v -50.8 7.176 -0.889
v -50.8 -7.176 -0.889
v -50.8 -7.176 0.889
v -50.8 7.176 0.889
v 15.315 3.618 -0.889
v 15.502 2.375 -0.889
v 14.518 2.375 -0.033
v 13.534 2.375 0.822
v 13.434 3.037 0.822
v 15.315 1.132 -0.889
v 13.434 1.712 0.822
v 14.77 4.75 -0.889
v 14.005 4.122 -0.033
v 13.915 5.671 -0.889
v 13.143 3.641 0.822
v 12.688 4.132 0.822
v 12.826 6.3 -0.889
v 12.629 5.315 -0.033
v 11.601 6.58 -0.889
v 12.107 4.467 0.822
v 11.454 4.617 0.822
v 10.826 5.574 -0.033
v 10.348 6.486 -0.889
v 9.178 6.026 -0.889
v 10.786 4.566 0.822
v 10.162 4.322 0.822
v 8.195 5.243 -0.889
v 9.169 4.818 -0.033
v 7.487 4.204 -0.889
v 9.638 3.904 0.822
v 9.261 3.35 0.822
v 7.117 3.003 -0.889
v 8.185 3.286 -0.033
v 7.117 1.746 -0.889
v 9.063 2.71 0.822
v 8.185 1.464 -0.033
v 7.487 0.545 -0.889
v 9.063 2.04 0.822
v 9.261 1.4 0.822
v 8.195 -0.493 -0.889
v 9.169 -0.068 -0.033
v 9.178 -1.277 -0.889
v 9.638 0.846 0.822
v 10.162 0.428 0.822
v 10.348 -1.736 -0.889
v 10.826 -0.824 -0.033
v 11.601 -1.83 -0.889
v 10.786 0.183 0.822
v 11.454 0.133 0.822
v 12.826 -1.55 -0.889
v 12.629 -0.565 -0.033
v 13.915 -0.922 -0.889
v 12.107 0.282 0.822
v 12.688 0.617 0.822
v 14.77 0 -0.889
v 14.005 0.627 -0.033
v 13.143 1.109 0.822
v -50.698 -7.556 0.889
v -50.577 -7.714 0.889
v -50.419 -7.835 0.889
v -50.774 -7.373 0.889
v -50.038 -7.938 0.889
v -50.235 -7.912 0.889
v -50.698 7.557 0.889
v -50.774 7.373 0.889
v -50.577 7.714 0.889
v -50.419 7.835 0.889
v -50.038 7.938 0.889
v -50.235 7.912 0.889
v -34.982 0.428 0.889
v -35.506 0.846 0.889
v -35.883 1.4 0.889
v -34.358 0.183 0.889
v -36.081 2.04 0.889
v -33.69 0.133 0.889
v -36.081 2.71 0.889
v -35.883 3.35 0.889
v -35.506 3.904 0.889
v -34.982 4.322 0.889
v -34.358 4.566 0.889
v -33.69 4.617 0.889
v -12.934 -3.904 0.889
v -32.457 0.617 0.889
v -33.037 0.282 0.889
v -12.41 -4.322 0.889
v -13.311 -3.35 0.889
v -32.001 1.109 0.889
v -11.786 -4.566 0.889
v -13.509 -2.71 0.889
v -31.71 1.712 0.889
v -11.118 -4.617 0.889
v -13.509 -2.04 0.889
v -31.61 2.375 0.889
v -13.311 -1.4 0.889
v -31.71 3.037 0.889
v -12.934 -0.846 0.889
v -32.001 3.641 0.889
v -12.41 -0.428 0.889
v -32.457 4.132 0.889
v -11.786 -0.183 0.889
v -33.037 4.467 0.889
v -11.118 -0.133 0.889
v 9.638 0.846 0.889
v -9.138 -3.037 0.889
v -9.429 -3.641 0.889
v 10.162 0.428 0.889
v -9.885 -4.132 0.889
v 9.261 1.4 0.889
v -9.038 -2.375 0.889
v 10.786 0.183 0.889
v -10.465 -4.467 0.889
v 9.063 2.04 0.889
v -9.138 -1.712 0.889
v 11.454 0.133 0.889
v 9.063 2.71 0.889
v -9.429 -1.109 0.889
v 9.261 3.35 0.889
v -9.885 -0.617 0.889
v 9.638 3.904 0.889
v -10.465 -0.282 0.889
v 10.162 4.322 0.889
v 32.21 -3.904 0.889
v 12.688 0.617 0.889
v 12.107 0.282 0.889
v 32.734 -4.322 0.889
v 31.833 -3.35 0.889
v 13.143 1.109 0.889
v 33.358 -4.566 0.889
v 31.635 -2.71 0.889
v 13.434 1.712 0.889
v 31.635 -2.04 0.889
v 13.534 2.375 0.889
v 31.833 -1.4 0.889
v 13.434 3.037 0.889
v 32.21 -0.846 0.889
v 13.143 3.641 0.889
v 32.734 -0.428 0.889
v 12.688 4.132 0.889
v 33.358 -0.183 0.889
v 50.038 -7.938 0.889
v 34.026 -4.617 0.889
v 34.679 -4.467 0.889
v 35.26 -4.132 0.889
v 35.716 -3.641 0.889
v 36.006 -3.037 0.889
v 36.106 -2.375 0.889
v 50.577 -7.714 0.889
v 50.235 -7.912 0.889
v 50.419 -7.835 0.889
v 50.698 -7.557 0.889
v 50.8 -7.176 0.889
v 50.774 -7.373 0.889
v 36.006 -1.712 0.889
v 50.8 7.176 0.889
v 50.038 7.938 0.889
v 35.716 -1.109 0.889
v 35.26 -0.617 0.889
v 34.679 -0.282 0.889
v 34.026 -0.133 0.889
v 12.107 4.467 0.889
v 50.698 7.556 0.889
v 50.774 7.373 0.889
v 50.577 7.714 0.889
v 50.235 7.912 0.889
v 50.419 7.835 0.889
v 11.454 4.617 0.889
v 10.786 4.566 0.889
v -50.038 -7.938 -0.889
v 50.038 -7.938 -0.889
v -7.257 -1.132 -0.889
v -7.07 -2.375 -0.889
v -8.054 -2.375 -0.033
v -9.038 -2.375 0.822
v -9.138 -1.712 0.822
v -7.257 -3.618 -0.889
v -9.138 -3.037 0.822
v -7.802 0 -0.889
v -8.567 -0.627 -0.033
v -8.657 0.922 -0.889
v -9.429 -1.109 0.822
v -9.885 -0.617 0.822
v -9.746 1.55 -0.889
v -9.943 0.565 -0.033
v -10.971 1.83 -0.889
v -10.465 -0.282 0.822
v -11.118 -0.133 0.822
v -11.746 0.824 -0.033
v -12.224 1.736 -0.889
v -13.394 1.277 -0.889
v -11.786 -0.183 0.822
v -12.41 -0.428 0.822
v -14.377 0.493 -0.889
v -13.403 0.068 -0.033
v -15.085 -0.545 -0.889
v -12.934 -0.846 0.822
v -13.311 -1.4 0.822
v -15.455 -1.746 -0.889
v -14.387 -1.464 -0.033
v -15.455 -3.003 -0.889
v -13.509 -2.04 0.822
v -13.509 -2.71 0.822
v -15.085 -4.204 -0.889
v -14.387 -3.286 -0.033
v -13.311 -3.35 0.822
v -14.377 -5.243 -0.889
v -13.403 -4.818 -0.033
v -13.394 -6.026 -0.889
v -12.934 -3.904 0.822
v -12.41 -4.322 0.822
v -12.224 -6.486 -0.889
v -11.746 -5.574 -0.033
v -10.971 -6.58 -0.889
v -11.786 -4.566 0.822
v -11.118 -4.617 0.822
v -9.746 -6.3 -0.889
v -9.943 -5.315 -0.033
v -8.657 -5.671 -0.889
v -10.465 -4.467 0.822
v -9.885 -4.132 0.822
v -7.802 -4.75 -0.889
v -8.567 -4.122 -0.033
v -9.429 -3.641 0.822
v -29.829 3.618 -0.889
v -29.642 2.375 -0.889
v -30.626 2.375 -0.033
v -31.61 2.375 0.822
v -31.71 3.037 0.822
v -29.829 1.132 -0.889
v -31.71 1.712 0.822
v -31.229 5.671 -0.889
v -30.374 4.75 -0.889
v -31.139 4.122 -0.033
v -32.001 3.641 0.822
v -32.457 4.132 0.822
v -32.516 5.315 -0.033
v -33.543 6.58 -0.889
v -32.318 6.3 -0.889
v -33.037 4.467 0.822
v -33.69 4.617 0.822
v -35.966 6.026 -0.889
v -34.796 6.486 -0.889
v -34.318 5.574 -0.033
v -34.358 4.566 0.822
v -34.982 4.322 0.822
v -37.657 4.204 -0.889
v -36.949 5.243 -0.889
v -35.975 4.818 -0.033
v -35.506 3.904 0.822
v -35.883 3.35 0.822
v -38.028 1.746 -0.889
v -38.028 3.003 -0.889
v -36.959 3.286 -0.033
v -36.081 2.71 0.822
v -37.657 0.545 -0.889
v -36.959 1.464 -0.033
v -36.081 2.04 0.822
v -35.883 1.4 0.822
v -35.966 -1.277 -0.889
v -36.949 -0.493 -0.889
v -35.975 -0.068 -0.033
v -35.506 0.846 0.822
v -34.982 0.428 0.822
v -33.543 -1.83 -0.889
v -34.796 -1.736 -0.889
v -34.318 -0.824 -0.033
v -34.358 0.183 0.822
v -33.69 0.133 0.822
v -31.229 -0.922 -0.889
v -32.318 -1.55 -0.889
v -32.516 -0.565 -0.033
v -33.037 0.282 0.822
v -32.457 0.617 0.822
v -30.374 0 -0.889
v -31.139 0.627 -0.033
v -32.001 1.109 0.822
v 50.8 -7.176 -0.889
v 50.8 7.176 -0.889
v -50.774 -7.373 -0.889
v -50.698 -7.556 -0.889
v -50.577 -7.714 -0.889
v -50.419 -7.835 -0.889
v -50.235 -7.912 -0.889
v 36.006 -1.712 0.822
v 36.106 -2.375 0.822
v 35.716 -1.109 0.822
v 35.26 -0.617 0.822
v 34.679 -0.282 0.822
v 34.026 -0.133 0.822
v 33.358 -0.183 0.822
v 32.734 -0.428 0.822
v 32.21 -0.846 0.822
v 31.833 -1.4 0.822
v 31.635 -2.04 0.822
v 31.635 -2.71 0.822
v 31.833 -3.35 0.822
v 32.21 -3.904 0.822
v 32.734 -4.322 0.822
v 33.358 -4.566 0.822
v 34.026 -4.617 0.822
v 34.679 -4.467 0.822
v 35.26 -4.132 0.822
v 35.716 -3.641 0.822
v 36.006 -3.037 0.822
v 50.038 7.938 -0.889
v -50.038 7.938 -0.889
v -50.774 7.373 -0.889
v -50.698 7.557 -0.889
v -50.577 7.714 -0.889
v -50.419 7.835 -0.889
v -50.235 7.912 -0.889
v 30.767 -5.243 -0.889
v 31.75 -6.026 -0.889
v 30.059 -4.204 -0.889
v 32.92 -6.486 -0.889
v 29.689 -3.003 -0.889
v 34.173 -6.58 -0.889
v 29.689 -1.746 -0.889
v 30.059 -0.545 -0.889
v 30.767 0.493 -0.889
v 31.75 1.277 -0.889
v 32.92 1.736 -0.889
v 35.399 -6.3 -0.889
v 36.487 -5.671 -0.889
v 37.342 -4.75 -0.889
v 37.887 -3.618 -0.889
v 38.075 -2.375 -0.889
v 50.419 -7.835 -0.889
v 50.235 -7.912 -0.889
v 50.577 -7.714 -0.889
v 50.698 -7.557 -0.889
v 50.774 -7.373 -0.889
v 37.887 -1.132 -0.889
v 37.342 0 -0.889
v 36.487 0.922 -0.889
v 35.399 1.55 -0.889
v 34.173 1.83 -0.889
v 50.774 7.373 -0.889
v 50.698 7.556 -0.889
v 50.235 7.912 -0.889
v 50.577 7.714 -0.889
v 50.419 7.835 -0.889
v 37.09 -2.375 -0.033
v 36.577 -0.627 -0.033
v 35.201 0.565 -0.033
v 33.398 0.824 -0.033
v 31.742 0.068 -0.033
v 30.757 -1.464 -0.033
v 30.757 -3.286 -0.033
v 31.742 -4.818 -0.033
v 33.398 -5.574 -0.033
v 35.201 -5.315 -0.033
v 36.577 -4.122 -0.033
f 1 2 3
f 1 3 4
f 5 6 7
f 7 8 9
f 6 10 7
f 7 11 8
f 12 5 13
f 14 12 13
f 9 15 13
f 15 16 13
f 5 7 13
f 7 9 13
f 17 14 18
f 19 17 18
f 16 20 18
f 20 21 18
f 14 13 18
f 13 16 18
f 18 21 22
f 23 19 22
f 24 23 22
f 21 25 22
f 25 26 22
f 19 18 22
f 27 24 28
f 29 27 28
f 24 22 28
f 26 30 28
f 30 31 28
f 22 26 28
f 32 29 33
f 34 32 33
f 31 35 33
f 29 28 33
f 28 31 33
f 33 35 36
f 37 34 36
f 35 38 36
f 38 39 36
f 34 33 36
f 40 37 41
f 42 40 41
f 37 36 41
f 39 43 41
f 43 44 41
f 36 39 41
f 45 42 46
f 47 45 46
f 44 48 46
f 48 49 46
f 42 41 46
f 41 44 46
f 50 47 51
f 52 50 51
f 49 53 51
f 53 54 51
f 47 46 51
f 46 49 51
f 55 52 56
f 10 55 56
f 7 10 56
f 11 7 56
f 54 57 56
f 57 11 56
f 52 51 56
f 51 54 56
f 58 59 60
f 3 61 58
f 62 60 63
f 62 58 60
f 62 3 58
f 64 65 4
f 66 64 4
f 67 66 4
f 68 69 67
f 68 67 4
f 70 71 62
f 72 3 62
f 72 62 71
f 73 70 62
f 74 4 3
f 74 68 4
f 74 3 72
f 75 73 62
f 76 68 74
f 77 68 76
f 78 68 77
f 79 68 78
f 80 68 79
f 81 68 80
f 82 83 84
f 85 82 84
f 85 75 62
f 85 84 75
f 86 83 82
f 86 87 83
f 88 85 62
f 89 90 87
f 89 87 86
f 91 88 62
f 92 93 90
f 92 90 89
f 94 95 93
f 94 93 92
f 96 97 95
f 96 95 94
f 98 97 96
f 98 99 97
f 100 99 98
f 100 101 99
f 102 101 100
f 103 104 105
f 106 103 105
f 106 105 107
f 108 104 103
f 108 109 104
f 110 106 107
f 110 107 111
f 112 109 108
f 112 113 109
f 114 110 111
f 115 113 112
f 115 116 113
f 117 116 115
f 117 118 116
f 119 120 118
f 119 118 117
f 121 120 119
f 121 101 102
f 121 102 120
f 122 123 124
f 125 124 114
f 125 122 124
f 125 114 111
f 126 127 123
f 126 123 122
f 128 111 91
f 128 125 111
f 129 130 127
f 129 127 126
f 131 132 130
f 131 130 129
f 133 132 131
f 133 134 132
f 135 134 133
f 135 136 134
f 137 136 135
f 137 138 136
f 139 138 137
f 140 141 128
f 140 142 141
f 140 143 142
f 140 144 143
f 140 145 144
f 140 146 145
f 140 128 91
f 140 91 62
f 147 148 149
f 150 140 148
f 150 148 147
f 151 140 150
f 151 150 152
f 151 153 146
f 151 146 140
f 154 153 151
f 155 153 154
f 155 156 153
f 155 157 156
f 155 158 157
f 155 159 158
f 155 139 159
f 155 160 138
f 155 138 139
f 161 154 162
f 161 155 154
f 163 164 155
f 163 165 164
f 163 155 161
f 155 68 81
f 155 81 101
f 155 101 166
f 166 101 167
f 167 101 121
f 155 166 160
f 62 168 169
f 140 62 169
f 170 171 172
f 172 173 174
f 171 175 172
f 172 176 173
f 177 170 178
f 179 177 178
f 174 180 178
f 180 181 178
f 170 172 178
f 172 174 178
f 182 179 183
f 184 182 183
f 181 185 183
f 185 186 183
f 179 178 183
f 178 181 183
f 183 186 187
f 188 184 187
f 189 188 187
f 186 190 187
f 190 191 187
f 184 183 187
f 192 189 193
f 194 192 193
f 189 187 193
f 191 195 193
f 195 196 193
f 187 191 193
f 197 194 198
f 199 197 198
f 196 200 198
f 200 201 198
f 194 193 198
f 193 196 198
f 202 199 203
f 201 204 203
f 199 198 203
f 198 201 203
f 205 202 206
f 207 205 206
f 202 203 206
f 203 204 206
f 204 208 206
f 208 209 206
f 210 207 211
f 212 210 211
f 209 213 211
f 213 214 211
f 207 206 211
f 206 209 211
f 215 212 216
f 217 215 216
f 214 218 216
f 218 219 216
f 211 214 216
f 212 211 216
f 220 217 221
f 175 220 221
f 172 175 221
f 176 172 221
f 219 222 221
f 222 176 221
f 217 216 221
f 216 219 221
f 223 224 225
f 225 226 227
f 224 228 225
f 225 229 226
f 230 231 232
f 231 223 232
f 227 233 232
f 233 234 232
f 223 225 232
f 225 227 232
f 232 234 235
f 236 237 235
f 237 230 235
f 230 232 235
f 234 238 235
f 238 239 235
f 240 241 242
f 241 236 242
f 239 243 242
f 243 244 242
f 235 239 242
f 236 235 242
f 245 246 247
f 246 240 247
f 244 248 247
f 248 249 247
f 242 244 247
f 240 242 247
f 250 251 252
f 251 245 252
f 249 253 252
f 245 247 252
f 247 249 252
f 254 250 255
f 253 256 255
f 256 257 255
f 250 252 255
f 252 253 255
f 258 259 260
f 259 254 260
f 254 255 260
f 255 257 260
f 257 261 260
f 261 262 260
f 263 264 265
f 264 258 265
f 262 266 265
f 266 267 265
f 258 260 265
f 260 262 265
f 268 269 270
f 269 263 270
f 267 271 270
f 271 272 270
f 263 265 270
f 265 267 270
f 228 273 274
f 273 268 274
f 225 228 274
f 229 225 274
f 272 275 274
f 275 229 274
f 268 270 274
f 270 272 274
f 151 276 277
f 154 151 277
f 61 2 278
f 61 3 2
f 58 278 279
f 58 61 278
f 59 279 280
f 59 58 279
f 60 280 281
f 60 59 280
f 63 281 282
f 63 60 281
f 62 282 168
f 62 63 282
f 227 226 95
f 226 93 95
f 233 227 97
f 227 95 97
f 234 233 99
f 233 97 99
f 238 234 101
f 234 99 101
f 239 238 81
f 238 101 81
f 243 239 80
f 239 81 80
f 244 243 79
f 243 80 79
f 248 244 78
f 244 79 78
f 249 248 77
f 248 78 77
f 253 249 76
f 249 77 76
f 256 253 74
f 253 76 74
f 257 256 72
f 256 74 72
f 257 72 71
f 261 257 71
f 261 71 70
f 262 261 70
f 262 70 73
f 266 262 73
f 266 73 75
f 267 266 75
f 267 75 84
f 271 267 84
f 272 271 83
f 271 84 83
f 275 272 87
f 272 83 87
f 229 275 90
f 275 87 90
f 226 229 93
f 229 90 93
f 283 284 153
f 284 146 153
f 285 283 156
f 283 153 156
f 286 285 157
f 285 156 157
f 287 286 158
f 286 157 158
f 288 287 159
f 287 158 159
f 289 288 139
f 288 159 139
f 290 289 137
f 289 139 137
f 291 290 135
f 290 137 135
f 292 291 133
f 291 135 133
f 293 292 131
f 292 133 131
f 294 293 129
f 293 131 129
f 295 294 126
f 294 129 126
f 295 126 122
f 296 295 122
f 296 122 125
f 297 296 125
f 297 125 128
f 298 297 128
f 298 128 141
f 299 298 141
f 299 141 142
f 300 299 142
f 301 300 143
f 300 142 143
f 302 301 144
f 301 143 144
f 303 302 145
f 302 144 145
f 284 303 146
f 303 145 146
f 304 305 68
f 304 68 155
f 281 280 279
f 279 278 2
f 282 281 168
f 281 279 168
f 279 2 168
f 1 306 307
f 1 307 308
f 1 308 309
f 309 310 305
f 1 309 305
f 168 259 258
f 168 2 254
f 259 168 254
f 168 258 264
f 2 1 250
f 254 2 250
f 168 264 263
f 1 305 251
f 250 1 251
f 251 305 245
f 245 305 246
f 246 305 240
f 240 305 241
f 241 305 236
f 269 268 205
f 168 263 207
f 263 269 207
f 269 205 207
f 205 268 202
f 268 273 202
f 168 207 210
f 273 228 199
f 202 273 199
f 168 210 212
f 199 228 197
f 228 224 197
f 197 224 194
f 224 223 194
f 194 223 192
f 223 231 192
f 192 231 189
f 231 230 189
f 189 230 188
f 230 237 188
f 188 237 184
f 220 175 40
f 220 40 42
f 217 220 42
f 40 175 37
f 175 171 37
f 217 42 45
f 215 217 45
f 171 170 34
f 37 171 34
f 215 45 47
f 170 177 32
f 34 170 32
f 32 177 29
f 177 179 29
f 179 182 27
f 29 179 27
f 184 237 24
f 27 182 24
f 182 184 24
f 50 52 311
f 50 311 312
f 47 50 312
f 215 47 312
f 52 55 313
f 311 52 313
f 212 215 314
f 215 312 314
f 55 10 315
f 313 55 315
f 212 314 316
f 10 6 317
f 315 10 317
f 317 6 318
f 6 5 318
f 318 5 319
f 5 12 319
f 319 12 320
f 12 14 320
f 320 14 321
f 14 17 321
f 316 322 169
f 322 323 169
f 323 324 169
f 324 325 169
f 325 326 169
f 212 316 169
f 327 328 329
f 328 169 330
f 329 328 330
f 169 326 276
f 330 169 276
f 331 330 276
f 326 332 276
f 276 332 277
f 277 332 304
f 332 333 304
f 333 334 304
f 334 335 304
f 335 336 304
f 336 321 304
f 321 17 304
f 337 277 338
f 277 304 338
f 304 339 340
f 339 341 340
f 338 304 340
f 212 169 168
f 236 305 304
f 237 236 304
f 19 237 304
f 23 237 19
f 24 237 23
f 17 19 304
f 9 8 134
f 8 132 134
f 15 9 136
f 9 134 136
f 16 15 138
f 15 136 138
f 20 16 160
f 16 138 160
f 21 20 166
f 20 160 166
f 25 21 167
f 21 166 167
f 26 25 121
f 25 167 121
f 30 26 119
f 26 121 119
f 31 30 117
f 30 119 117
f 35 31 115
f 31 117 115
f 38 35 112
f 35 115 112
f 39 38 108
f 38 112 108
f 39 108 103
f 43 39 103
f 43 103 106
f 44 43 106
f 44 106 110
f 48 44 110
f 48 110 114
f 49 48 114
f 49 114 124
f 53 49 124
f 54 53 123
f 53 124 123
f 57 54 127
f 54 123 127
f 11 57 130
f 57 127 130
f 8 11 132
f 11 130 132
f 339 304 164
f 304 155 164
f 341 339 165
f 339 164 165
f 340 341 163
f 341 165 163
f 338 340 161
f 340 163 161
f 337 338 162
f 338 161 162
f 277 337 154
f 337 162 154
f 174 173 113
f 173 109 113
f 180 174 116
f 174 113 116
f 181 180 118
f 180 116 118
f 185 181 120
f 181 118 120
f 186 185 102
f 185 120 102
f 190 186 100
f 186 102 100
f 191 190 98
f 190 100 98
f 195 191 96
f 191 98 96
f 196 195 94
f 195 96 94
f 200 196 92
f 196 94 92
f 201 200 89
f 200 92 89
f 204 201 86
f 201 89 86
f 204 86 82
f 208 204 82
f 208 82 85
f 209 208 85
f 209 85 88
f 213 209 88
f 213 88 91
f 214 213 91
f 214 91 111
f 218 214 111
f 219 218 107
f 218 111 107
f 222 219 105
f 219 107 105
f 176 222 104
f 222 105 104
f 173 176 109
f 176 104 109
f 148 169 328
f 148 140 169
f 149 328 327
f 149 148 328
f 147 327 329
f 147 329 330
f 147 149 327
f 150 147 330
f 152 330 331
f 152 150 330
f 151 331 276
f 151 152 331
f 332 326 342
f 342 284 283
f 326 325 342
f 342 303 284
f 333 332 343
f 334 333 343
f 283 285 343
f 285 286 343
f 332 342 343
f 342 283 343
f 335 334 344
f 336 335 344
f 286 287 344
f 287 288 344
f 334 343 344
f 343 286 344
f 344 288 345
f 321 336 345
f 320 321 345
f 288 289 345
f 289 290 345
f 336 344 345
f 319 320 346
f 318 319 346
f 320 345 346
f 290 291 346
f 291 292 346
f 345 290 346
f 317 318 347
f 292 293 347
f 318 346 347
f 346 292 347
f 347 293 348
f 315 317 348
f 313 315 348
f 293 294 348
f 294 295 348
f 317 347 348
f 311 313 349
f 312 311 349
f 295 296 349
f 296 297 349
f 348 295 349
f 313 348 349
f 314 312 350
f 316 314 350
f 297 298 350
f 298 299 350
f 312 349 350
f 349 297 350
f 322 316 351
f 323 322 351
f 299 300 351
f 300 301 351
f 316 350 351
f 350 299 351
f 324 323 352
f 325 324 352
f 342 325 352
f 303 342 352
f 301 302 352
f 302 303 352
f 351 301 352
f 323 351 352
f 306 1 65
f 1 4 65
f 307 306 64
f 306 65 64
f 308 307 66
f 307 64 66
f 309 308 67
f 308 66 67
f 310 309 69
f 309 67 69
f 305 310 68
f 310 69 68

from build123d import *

# Parameters (mm, degrees)
BOSS_EXTRUDE1_DEPTH      = 0.889
BOSS_EXTRUDE1_DEPTH_BACK = 0.889
SKETCH4_W                = 101.6
SKETCH4_H                = 15.875
SKETCH5_R                = 2.2479
CUT_EXTRUDE1_DEPTH       = 52.424062726
SKETCH6_R                = 4.2164
CUT_EXTRUDE2_DEPTH       = 52.447110611
CUT_EXTRUDE2_TAPER       = 49
FILLET1_R                = 0.762


# Read off the part's stored shape, not the designer's step: Sketch-Pattern1
with BuildPart() as part:
    # Sketch4 → Boss-Extrude1 (new, two sides: drawn at the far end of the back side and taken through both)
    with BuildSketch(Plane.XY.offset(-BOSS_EXTRUDE1_DEPTH_BACK)):
        Rectangle(SKETCH4_W, SKETCH4_H)
    extrude(amount=BOSS_EXTRUDE1_DEPTH + BOSS_EXTRUDE1_DEPTH_BACK)

    # Sketch5 → Cut-Extrude1 (cut, symmetric)
    with BuildSketch(Plane.XY):
        with Locations((-33.8582, 2.3749)):
            Circle(SKETCH5_R)
    extrude(amount=CUT_EXTRUDE1_DEPTH, both=True, mode=Mode.SUBTRACT)

    # Sketch6 → Cut-Extrude2 (cut, through all)
    with BuildSketch(Plane.XY.offset(-0.889)):
        with Locations((-33.8582, 2.3749)):
            Circle(SKETCH6_R)
    extrude(amount=CUT_EXTRUDE2_DEPTH, taper=CUT_EXTRUDE2_TAPER, mode=Mode.SUBTRACT)

    # Sketch-Pattern1 outline → Sketch-Pattern1 (revolve, cut)
    with BuildSketch(Plane(origin=(11.286066667, 2.3749, 0), x_dir=(1, 0, 0), z_dir=(0, -1, 0))):
        Polygon((0, -0.889), (4.2164, -0.889), (2.2479, 0.822190943), (2.2479, 0.889), (0, 0.889), align=None)
    revolve(axis=Axis((11.286066667, 2.3749, 0), (0, 0, 1)), mode=Mode.SUBTRACT)

    # Sketch-Pattern1 2 outline → Sketch-Pattern1 2 (revolve, cut)
    with BuildSketch(Plane(origin=(33.8582, -2.3749, 0), x_dir=(1, 0, 0), z_dir=(0, -1, 0))):
        Polygon((0, -0.889), (4.2164, -0.889), (2.2479, 0.822190943), (2.2479, 0.889), (0, 0.889), align=None)
    revolve(axis=Axis((33.8582, -2.3749, 0), (0, 0, 1)), mode=Mode.SUBTRACT)

    # Sketch-Pattern1 3 outline → Sketch-Pattern1 3 (revolve, cut)
    with BuildSketch(Plane(origin=(-11.286066667, -2.3749, 0), x_dir=(1, 0, 0), z_dir=(0, -1, 0))):
        Polygon((0, -0.889), (4.2164, -0.889), (2.2479, 0.822190943), (2.2479, 0.889), (0, 0.889), align=None)
    revolve(axis=Axis((-11.286066667, -2.3749, 0), (0, 0, 1)), mode=Mode.SUBTRACT)

    # Fillet1
    fillet1_edges = [part.edges().sort_by_distance(p)[0] for p in [
        (-50.8, 7.9375, 0),
        (50.8, 7.9375, 0),
        (50.8, -7.9375, 0),
        (-50.8, -7.9375, 0),
    ]]
    fillet(fillet1_edges, radius=FILLET1_R)


solid = part.part
